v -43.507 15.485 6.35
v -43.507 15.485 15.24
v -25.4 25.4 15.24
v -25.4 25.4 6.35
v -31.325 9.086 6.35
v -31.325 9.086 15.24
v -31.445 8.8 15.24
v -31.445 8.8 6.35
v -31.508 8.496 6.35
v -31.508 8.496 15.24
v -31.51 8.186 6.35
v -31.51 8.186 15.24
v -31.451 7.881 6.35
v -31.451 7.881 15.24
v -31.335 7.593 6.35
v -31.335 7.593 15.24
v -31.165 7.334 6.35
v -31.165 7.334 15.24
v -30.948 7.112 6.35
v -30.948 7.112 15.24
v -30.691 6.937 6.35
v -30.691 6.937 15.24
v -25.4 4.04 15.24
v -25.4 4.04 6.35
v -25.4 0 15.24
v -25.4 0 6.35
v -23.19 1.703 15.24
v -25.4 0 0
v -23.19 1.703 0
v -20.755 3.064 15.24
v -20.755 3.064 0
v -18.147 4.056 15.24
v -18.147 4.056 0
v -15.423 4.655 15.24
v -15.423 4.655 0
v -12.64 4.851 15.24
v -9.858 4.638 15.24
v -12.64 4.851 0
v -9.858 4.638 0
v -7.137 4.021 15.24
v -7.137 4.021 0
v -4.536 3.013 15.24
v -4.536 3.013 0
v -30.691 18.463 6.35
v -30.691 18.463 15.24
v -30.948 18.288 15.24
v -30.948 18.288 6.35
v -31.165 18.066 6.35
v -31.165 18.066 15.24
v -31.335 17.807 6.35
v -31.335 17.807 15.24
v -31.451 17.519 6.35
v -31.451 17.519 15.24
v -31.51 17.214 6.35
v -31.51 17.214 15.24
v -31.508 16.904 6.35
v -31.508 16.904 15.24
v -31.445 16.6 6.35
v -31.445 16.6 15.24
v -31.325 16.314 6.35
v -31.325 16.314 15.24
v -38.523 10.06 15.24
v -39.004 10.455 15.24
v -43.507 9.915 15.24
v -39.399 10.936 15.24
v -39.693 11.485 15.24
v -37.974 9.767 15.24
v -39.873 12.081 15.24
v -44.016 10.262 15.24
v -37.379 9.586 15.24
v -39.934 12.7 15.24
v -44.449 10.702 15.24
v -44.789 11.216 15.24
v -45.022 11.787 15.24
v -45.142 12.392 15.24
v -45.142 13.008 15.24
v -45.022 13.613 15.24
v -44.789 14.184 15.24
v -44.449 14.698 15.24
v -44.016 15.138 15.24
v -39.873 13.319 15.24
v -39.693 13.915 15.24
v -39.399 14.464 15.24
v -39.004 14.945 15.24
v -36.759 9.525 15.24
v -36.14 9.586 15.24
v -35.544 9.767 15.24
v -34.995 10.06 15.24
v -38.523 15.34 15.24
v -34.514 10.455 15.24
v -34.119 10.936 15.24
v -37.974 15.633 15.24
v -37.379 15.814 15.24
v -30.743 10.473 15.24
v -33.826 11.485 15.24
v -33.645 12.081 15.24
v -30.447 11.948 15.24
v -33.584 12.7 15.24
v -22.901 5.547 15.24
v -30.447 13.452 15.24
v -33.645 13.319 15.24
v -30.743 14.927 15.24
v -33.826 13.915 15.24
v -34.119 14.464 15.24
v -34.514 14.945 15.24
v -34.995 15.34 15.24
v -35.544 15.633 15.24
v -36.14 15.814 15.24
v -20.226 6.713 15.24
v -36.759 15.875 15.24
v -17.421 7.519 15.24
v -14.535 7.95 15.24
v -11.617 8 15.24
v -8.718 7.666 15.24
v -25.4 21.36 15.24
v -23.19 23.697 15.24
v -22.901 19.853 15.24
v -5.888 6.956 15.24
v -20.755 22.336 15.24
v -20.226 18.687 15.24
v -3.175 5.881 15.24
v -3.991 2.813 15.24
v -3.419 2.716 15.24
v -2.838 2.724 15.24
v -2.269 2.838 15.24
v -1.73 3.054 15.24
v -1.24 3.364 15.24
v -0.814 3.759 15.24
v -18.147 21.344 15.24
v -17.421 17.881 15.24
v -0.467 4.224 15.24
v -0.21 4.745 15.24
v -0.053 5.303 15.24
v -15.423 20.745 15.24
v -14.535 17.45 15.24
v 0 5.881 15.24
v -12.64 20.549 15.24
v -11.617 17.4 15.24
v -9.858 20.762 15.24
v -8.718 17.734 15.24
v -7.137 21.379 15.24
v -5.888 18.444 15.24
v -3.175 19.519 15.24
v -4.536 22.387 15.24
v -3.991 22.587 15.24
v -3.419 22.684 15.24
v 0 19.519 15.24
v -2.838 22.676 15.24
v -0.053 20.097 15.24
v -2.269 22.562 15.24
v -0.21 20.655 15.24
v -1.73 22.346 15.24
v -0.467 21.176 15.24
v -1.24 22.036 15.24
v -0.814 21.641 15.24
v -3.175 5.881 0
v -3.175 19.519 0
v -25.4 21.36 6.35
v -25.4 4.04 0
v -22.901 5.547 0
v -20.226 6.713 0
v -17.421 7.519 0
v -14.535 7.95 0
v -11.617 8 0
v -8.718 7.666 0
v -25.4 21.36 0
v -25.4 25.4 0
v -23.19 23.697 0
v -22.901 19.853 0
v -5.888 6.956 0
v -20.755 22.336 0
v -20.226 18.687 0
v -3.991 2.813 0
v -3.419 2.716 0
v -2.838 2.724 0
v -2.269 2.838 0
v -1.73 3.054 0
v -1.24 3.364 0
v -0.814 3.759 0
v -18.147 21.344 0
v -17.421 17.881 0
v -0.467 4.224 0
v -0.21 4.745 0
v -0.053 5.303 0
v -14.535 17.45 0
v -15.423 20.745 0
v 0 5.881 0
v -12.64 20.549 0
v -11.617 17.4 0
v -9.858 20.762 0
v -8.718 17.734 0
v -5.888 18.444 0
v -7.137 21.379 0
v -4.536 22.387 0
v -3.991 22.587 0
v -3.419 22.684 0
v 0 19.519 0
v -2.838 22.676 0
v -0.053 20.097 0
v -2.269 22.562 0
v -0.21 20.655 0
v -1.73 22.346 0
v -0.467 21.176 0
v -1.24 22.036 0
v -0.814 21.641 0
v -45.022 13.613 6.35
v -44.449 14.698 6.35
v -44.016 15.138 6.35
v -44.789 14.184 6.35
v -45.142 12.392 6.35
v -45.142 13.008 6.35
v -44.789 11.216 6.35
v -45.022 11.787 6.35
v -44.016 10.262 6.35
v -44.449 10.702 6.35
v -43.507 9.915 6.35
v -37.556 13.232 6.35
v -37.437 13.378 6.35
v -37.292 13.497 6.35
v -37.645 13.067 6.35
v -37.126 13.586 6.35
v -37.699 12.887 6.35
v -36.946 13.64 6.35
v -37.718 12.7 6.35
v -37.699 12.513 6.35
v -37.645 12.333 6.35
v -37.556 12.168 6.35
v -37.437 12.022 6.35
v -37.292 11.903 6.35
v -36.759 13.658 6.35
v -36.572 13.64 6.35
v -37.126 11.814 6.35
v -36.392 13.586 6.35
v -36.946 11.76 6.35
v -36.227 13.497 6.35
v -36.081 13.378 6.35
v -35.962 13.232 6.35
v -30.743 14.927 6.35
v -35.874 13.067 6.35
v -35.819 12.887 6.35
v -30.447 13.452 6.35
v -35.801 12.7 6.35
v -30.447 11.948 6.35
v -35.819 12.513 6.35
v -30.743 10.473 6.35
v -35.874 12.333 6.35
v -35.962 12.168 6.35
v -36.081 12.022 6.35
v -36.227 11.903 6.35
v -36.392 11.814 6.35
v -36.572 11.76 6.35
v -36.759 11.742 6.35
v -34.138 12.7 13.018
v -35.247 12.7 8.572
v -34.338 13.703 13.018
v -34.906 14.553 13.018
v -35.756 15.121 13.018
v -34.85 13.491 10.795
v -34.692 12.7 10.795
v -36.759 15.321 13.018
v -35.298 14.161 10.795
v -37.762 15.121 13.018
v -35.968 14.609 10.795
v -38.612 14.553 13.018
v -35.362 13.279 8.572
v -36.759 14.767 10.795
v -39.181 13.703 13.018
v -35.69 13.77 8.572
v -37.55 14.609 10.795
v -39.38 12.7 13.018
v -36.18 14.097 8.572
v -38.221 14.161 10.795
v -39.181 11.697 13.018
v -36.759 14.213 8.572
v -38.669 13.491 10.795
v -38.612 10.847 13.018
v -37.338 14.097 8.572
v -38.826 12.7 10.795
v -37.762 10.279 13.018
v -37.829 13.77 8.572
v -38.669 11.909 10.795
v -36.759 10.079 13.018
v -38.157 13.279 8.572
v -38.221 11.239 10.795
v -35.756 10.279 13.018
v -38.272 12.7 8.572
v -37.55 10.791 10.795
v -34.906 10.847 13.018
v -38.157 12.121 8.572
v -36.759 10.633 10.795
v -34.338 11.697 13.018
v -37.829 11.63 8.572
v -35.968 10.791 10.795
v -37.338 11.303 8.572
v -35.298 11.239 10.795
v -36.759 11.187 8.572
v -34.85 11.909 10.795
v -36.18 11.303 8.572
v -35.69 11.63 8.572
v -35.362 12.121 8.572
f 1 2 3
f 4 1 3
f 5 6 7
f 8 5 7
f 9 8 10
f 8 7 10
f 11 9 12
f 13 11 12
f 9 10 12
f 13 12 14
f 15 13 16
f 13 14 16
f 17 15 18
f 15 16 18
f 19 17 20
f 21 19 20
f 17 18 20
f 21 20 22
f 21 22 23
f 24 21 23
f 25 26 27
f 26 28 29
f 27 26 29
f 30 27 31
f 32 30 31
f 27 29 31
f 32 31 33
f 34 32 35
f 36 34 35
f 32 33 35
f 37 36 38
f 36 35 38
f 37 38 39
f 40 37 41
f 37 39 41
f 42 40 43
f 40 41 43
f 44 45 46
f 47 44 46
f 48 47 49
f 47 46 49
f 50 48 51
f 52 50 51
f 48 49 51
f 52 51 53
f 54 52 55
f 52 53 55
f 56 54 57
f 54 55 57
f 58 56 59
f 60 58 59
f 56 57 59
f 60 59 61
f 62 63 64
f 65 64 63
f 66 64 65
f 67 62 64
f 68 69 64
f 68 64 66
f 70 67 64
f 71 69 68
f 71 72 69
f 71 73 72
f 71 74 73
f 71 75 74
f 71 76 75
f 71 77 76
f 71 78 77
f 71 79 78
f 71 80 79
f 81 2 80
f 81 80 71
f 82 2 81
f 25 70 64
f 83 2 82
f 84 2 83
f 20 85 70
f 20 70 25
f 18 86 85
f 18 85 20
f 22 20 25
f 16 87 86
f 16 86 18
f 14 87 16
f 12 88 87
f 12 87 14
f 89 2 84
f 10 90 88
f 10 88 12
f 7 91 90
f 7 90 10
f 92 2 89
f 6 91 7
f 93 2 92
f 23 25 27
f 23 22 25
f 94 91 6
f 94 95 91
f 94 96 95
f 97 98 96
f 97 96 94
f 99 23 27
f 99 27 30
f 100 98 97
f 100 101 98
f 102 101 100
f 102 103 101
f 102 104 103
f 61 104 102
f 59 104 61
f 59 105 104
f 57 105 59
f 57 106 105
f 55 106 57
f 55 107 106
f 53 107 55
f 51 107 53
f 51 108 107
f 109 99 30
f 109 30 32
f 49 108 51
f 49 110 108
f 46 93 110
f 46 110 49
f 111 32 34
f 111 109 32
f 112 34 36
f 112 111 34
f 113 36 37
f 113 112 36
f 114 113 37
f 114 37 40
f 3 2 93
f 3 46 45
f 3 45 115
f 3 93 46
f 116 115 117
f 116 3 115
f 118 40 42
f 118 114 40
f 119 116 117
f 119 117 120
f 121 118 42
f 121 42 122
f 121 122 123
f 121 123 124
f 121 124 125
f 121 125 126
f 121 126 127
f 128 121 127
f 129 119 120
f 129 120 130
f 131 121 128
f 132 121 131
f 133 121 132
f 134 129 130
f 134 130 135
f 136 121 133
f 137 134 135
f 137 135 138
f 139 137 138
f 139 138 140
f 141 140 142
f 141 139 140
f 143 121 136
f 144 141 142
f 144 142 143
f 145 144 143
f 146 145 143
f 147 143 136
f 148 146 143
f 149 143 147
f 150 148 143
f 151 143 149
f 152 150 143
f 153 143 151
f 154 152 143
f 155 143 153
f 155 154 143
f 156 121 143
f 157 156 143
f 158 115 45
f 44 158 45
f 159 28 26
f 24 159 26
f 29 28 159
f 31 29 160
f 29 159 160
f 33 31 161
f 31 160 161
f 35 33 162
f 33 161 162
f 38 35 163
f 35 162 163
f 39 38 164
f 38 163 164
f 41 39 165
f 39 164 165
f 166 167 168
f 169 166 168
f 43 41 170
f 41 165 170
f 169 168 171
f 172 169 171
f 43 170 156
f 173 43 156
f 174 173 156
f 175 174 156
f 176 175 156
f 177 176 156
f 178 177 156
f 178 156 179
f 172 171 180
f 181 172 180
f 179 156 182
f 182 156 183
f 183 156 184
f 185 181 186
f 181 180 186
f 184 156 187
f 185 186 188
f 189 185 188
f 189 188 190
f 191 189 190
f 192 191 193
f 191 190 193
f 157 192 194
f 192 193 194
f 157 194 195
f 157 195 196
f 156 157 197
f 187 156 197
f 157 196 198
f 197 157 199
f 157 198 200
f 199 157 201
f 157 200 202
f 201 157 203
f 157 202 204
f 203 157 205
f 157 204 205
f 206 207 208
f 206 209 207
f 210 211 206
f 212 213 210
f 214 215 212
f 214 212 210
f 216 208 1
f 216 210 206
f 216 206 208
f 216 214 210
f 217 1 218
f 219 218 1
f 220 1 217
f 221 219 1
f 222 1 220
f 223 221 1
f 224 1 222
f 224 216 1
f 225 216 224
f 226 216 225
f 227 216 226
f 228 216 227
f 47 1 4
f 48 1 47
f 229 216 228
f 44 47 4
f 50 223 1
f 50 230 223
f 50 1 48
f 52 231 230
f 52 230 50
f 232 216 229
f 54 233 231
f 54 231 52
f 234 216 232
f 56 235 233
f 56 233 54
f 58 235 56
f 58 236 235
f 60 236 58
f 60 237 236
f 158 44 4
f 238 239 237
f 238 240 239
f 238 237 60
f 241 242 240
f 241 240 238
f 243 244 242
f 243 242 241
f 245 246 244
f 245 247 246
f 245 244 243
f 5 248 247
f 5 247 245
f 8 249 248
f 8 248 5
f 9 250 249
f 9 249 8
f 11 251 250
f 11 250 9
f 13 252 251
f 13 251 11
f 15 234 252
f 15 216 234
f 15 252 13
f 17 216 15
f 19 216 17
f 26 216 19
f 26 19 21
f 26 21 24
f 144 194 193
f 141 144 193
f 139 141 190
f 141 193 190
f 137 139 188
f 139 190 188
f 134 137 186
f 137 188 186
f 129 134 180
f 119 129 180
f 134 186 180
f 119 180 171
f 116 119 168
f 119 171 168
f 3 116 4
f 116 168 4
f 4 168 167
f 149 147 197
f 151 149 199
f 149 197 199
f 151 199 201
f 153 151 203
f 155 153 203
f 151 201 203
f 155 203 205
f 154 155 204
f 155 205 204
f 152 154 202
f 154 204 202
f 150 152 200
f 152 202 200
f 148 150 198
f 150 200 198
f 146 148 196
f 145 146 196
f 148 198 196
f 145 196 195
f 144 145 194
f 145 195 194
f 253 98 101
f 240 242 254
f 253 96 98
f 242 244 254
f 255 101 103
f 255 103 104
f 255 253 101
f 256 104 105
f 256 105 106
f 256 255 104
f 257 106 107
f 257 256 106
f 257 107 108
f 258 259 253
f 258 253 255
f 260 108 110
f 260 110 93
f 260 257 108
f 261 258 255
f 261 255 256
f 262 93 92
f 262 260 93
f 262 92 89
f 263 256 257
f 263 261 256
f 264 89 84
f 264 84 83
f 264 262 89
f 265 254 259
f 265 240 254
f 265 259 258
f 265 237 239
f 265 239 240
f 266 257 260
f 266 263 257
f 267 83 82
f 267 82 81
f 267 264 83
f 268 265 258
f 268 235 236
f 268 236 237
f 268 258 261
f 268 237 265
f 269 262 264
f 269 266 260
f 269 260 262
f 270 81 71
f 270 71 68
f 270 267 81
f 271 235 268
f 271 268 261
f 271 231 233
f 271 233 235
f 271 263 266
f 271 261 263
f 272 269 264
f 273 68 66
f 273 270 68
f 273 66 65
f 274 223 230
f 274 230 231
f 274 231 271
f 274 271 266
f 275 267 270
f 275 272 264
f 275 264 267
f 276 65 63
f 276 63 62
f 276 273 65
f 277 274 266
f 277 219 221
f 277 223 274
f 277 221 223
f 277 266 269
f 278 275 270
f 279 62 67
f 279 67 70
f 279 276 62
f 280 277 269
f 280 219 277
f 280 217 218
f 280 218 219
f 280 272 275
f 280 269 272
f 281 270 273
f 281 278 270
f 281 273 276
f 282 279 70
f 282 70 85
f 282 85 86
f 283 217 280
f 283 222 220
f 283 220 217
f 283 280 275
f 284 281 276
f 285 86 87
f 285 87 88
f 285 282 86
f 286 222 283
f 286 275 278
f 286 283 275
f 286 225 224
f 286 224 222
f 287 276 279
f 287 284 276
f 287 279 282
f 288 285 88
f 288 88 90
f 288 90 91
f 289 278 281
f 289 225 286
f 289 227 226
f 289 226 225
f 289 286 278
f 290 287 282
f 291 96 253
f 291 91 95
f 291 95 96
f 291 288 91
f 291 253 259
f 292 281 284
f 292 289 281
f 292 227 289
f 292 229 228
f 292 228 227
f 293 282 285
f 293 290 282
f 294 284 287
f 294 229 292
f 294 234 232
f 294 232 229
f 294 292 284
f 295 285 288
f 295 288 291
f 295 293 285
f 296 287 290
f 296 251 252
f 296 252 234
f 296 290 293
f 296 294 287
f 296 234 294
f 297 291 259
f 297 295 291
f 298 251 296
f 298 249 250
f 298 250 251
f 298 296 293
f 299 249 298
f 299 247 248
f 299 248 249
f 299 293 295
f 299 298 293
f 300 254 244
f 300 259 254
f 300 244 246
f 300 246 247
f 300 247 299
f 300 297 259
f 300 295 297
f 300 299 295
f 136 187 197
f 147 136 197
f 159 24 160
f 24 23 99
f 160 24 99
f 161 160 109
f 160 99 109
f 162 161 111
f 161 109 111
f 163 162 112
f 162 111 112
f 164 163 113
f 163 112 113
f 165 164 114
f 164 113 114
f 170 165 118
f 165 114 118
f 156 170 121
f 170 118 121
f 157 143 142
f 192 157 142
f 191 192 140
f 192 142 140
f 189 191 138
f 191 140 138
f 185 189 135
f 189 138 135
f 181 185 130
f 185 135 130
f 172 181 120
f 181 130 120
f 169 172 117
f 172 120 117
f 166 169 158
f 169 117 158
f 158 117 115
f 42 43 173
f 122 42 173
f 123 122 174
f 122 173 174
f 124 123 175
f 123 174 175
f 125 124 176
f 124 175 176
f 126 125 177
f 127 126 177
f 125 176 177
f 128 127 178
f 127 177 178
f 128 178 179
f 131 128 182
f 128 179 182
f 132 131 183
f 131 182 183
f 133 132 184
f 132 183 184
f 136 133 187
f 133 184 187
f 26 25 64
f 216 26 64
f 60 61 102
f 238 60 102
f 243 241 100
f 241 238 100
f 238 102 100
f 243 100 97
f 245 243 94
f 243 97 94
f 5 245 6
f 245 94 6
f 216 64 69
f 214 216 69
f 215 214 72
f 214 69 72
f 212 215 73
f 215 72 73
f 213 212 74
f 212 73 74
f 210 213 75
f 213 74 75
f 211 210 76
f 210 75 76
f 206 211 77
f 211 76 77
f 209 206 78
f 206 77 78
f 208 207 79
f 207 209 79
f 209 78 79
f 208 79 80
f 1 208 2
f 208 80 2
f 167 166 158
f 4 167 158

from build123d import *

# Parameters (mm, degrees)
F1_DEPTH = 15.24
F2_R     = 3.175
F5_DEPTH = 15.241
F6_W     = 38.1
F6_H     = 6.35
F7_DEPTH = 25.401


# Not quite as in the source:
# - an extrude whose draft closes it to a point is written as a loft to that point


with BuildPart() as f1:
    # F0 (on Top) → F1 (new body)
    with BuildSketch(Plane.XY):
        with BuildLine():
            ThreePointArc((-25.4, 25.4), (-53.7980633142, 12.7), (-25.4, 0))
            Line((-25.4, 0), (-34.5618496597, 0))
            Line((-34.5618496597, 0), (-34.5618496597, 25.4))
            Line((-34.5618496597, 25.4), (-25.4, 25.4))
        make_face()
        with BuildLine():
            Line((-34.5618496597, 0), (-25.4, 0))
            ThreePointArc((-25.4, 0), (-21.204965459, 5.7439235197), (-19.7203873372, 12.7))
            ThreePointArc((-19.7203873372, 12.7), (-21.204965459, 19.6560764803), (-25.4, 25.4))
            Line((-25.4, 25.4), (-34.5618496597, 25.4))
            Line((-34.5618496597, 25.4), (-34.5618496597, 0))
        make_face()
        with BuildLine():
            ThreePointArc((-19.7203873372, 12.7), (-21.204965459, 5.7439235197), (-25.4, 0))
            ThreePointArc((-25.4, 0), (-15.4225737421, 4.6554132358), (-4.5357142857, 3.0127938932))
            ThreePointArc((-4.5357142857, 3.0127938932), (-1.4778911139, 3.1980667262), (0, 5.8814314849))
            Line((0, 5.8814314849), (0, 19.5185685151))
            ThreePointArc((0, 19.5185685151), (-1.4778911139, 22.2019332738), (-4.5357142857, 22.3872061068))
            ThreePointArc((-4.5357142857, 22.3872061068), (-15.4225737421, 20.7445867642), (-25.4, 25.4))
            ThreePointArc((-25.4, 25.4), (-21.204965459, 19.6560764803), (-19.7203873372, 12.7))
        make_face()
    extrude(amount=F1_DEPTH)

    # F2 (on face) → F3 section 0
    with BuildSketch(Plane.XY.offset(15.24), mode=Mode.PRIVATE) as f3_s0:
        with Locations((-36.7592253257, 12.7)):
            Circle(F2_R)
    loft([f3_s0.sketch, Vertex(-36.7592253257, 12.7, 2.505770536)], ruled=True, mode=Mode.SUBTRACT)

    # F4 (on face) → F5 (cut, through all)
    with BuildSketch(Plane.XY.offset(15.24)):
        with BuildLine():
            ThreePointArc((-25.4, 4.0399547456), (-14.535188109, 7.9500701216), (-3.175, 5.8814314849))
            Line((-3.175, 5.8814314849), (-3.175, 19.5185685151))
            ThreePointArc((-3.175, 19.5185685151), (-14.535188109, 17.4499298784), (-25.4, 21.3600452544))
            Line((-25.4, 21.3600452544), (-30.6912422422, 18.4625566245))
            ThreePointArc((-30.6912422422, 18.4625566245), (-31.4514193427, 17.5192344091), (-31.3248088175, 16.3143710139))
            ThreePointArc((-31.3248088175, 16.3143710139), (-30.4092253257, 12.7), (-31.3248088175, 9.0856289861))
            ThreePointArc((-31.3248088175, 9.0856289861), (-31.4514193427, 7.8807655909), (-30.6912422422, 6.9374433755))
            Line((-30.6912422422, 6.9374433755), (-25.4, 4.0399547456))
        make_face()
        with BuildLine():
            ThreePointArc((-25.4, 25.4), (-53.7980633142, 12.7), (-25.4, 0))
            Line((-25.4, 0), (-43.5066161293, 9.9151979742))
            ThreePointArc((-43.5066161293, 9.9151979742), (-45.1566562358, 12.7), (-43.5066161293, 15.4848020258))
            Line((-43.5066161293, 15.4848020258), (-25.4, 25.4))
        make_face()
    extrude(amount=-F5_DEPTH, mode=Mode.SUBTRACT)

    # F6 (on Front) → F7 (cut, through all)
    with BuildSketch(Plane.XZ):
        with Locations((-44.45, 3.175)):
            Rectangle(F6_W, F6_H)
    extrude(amount=-F7_DEPTH, mode=Mode.SUBTRACT)


solid = f1.part
